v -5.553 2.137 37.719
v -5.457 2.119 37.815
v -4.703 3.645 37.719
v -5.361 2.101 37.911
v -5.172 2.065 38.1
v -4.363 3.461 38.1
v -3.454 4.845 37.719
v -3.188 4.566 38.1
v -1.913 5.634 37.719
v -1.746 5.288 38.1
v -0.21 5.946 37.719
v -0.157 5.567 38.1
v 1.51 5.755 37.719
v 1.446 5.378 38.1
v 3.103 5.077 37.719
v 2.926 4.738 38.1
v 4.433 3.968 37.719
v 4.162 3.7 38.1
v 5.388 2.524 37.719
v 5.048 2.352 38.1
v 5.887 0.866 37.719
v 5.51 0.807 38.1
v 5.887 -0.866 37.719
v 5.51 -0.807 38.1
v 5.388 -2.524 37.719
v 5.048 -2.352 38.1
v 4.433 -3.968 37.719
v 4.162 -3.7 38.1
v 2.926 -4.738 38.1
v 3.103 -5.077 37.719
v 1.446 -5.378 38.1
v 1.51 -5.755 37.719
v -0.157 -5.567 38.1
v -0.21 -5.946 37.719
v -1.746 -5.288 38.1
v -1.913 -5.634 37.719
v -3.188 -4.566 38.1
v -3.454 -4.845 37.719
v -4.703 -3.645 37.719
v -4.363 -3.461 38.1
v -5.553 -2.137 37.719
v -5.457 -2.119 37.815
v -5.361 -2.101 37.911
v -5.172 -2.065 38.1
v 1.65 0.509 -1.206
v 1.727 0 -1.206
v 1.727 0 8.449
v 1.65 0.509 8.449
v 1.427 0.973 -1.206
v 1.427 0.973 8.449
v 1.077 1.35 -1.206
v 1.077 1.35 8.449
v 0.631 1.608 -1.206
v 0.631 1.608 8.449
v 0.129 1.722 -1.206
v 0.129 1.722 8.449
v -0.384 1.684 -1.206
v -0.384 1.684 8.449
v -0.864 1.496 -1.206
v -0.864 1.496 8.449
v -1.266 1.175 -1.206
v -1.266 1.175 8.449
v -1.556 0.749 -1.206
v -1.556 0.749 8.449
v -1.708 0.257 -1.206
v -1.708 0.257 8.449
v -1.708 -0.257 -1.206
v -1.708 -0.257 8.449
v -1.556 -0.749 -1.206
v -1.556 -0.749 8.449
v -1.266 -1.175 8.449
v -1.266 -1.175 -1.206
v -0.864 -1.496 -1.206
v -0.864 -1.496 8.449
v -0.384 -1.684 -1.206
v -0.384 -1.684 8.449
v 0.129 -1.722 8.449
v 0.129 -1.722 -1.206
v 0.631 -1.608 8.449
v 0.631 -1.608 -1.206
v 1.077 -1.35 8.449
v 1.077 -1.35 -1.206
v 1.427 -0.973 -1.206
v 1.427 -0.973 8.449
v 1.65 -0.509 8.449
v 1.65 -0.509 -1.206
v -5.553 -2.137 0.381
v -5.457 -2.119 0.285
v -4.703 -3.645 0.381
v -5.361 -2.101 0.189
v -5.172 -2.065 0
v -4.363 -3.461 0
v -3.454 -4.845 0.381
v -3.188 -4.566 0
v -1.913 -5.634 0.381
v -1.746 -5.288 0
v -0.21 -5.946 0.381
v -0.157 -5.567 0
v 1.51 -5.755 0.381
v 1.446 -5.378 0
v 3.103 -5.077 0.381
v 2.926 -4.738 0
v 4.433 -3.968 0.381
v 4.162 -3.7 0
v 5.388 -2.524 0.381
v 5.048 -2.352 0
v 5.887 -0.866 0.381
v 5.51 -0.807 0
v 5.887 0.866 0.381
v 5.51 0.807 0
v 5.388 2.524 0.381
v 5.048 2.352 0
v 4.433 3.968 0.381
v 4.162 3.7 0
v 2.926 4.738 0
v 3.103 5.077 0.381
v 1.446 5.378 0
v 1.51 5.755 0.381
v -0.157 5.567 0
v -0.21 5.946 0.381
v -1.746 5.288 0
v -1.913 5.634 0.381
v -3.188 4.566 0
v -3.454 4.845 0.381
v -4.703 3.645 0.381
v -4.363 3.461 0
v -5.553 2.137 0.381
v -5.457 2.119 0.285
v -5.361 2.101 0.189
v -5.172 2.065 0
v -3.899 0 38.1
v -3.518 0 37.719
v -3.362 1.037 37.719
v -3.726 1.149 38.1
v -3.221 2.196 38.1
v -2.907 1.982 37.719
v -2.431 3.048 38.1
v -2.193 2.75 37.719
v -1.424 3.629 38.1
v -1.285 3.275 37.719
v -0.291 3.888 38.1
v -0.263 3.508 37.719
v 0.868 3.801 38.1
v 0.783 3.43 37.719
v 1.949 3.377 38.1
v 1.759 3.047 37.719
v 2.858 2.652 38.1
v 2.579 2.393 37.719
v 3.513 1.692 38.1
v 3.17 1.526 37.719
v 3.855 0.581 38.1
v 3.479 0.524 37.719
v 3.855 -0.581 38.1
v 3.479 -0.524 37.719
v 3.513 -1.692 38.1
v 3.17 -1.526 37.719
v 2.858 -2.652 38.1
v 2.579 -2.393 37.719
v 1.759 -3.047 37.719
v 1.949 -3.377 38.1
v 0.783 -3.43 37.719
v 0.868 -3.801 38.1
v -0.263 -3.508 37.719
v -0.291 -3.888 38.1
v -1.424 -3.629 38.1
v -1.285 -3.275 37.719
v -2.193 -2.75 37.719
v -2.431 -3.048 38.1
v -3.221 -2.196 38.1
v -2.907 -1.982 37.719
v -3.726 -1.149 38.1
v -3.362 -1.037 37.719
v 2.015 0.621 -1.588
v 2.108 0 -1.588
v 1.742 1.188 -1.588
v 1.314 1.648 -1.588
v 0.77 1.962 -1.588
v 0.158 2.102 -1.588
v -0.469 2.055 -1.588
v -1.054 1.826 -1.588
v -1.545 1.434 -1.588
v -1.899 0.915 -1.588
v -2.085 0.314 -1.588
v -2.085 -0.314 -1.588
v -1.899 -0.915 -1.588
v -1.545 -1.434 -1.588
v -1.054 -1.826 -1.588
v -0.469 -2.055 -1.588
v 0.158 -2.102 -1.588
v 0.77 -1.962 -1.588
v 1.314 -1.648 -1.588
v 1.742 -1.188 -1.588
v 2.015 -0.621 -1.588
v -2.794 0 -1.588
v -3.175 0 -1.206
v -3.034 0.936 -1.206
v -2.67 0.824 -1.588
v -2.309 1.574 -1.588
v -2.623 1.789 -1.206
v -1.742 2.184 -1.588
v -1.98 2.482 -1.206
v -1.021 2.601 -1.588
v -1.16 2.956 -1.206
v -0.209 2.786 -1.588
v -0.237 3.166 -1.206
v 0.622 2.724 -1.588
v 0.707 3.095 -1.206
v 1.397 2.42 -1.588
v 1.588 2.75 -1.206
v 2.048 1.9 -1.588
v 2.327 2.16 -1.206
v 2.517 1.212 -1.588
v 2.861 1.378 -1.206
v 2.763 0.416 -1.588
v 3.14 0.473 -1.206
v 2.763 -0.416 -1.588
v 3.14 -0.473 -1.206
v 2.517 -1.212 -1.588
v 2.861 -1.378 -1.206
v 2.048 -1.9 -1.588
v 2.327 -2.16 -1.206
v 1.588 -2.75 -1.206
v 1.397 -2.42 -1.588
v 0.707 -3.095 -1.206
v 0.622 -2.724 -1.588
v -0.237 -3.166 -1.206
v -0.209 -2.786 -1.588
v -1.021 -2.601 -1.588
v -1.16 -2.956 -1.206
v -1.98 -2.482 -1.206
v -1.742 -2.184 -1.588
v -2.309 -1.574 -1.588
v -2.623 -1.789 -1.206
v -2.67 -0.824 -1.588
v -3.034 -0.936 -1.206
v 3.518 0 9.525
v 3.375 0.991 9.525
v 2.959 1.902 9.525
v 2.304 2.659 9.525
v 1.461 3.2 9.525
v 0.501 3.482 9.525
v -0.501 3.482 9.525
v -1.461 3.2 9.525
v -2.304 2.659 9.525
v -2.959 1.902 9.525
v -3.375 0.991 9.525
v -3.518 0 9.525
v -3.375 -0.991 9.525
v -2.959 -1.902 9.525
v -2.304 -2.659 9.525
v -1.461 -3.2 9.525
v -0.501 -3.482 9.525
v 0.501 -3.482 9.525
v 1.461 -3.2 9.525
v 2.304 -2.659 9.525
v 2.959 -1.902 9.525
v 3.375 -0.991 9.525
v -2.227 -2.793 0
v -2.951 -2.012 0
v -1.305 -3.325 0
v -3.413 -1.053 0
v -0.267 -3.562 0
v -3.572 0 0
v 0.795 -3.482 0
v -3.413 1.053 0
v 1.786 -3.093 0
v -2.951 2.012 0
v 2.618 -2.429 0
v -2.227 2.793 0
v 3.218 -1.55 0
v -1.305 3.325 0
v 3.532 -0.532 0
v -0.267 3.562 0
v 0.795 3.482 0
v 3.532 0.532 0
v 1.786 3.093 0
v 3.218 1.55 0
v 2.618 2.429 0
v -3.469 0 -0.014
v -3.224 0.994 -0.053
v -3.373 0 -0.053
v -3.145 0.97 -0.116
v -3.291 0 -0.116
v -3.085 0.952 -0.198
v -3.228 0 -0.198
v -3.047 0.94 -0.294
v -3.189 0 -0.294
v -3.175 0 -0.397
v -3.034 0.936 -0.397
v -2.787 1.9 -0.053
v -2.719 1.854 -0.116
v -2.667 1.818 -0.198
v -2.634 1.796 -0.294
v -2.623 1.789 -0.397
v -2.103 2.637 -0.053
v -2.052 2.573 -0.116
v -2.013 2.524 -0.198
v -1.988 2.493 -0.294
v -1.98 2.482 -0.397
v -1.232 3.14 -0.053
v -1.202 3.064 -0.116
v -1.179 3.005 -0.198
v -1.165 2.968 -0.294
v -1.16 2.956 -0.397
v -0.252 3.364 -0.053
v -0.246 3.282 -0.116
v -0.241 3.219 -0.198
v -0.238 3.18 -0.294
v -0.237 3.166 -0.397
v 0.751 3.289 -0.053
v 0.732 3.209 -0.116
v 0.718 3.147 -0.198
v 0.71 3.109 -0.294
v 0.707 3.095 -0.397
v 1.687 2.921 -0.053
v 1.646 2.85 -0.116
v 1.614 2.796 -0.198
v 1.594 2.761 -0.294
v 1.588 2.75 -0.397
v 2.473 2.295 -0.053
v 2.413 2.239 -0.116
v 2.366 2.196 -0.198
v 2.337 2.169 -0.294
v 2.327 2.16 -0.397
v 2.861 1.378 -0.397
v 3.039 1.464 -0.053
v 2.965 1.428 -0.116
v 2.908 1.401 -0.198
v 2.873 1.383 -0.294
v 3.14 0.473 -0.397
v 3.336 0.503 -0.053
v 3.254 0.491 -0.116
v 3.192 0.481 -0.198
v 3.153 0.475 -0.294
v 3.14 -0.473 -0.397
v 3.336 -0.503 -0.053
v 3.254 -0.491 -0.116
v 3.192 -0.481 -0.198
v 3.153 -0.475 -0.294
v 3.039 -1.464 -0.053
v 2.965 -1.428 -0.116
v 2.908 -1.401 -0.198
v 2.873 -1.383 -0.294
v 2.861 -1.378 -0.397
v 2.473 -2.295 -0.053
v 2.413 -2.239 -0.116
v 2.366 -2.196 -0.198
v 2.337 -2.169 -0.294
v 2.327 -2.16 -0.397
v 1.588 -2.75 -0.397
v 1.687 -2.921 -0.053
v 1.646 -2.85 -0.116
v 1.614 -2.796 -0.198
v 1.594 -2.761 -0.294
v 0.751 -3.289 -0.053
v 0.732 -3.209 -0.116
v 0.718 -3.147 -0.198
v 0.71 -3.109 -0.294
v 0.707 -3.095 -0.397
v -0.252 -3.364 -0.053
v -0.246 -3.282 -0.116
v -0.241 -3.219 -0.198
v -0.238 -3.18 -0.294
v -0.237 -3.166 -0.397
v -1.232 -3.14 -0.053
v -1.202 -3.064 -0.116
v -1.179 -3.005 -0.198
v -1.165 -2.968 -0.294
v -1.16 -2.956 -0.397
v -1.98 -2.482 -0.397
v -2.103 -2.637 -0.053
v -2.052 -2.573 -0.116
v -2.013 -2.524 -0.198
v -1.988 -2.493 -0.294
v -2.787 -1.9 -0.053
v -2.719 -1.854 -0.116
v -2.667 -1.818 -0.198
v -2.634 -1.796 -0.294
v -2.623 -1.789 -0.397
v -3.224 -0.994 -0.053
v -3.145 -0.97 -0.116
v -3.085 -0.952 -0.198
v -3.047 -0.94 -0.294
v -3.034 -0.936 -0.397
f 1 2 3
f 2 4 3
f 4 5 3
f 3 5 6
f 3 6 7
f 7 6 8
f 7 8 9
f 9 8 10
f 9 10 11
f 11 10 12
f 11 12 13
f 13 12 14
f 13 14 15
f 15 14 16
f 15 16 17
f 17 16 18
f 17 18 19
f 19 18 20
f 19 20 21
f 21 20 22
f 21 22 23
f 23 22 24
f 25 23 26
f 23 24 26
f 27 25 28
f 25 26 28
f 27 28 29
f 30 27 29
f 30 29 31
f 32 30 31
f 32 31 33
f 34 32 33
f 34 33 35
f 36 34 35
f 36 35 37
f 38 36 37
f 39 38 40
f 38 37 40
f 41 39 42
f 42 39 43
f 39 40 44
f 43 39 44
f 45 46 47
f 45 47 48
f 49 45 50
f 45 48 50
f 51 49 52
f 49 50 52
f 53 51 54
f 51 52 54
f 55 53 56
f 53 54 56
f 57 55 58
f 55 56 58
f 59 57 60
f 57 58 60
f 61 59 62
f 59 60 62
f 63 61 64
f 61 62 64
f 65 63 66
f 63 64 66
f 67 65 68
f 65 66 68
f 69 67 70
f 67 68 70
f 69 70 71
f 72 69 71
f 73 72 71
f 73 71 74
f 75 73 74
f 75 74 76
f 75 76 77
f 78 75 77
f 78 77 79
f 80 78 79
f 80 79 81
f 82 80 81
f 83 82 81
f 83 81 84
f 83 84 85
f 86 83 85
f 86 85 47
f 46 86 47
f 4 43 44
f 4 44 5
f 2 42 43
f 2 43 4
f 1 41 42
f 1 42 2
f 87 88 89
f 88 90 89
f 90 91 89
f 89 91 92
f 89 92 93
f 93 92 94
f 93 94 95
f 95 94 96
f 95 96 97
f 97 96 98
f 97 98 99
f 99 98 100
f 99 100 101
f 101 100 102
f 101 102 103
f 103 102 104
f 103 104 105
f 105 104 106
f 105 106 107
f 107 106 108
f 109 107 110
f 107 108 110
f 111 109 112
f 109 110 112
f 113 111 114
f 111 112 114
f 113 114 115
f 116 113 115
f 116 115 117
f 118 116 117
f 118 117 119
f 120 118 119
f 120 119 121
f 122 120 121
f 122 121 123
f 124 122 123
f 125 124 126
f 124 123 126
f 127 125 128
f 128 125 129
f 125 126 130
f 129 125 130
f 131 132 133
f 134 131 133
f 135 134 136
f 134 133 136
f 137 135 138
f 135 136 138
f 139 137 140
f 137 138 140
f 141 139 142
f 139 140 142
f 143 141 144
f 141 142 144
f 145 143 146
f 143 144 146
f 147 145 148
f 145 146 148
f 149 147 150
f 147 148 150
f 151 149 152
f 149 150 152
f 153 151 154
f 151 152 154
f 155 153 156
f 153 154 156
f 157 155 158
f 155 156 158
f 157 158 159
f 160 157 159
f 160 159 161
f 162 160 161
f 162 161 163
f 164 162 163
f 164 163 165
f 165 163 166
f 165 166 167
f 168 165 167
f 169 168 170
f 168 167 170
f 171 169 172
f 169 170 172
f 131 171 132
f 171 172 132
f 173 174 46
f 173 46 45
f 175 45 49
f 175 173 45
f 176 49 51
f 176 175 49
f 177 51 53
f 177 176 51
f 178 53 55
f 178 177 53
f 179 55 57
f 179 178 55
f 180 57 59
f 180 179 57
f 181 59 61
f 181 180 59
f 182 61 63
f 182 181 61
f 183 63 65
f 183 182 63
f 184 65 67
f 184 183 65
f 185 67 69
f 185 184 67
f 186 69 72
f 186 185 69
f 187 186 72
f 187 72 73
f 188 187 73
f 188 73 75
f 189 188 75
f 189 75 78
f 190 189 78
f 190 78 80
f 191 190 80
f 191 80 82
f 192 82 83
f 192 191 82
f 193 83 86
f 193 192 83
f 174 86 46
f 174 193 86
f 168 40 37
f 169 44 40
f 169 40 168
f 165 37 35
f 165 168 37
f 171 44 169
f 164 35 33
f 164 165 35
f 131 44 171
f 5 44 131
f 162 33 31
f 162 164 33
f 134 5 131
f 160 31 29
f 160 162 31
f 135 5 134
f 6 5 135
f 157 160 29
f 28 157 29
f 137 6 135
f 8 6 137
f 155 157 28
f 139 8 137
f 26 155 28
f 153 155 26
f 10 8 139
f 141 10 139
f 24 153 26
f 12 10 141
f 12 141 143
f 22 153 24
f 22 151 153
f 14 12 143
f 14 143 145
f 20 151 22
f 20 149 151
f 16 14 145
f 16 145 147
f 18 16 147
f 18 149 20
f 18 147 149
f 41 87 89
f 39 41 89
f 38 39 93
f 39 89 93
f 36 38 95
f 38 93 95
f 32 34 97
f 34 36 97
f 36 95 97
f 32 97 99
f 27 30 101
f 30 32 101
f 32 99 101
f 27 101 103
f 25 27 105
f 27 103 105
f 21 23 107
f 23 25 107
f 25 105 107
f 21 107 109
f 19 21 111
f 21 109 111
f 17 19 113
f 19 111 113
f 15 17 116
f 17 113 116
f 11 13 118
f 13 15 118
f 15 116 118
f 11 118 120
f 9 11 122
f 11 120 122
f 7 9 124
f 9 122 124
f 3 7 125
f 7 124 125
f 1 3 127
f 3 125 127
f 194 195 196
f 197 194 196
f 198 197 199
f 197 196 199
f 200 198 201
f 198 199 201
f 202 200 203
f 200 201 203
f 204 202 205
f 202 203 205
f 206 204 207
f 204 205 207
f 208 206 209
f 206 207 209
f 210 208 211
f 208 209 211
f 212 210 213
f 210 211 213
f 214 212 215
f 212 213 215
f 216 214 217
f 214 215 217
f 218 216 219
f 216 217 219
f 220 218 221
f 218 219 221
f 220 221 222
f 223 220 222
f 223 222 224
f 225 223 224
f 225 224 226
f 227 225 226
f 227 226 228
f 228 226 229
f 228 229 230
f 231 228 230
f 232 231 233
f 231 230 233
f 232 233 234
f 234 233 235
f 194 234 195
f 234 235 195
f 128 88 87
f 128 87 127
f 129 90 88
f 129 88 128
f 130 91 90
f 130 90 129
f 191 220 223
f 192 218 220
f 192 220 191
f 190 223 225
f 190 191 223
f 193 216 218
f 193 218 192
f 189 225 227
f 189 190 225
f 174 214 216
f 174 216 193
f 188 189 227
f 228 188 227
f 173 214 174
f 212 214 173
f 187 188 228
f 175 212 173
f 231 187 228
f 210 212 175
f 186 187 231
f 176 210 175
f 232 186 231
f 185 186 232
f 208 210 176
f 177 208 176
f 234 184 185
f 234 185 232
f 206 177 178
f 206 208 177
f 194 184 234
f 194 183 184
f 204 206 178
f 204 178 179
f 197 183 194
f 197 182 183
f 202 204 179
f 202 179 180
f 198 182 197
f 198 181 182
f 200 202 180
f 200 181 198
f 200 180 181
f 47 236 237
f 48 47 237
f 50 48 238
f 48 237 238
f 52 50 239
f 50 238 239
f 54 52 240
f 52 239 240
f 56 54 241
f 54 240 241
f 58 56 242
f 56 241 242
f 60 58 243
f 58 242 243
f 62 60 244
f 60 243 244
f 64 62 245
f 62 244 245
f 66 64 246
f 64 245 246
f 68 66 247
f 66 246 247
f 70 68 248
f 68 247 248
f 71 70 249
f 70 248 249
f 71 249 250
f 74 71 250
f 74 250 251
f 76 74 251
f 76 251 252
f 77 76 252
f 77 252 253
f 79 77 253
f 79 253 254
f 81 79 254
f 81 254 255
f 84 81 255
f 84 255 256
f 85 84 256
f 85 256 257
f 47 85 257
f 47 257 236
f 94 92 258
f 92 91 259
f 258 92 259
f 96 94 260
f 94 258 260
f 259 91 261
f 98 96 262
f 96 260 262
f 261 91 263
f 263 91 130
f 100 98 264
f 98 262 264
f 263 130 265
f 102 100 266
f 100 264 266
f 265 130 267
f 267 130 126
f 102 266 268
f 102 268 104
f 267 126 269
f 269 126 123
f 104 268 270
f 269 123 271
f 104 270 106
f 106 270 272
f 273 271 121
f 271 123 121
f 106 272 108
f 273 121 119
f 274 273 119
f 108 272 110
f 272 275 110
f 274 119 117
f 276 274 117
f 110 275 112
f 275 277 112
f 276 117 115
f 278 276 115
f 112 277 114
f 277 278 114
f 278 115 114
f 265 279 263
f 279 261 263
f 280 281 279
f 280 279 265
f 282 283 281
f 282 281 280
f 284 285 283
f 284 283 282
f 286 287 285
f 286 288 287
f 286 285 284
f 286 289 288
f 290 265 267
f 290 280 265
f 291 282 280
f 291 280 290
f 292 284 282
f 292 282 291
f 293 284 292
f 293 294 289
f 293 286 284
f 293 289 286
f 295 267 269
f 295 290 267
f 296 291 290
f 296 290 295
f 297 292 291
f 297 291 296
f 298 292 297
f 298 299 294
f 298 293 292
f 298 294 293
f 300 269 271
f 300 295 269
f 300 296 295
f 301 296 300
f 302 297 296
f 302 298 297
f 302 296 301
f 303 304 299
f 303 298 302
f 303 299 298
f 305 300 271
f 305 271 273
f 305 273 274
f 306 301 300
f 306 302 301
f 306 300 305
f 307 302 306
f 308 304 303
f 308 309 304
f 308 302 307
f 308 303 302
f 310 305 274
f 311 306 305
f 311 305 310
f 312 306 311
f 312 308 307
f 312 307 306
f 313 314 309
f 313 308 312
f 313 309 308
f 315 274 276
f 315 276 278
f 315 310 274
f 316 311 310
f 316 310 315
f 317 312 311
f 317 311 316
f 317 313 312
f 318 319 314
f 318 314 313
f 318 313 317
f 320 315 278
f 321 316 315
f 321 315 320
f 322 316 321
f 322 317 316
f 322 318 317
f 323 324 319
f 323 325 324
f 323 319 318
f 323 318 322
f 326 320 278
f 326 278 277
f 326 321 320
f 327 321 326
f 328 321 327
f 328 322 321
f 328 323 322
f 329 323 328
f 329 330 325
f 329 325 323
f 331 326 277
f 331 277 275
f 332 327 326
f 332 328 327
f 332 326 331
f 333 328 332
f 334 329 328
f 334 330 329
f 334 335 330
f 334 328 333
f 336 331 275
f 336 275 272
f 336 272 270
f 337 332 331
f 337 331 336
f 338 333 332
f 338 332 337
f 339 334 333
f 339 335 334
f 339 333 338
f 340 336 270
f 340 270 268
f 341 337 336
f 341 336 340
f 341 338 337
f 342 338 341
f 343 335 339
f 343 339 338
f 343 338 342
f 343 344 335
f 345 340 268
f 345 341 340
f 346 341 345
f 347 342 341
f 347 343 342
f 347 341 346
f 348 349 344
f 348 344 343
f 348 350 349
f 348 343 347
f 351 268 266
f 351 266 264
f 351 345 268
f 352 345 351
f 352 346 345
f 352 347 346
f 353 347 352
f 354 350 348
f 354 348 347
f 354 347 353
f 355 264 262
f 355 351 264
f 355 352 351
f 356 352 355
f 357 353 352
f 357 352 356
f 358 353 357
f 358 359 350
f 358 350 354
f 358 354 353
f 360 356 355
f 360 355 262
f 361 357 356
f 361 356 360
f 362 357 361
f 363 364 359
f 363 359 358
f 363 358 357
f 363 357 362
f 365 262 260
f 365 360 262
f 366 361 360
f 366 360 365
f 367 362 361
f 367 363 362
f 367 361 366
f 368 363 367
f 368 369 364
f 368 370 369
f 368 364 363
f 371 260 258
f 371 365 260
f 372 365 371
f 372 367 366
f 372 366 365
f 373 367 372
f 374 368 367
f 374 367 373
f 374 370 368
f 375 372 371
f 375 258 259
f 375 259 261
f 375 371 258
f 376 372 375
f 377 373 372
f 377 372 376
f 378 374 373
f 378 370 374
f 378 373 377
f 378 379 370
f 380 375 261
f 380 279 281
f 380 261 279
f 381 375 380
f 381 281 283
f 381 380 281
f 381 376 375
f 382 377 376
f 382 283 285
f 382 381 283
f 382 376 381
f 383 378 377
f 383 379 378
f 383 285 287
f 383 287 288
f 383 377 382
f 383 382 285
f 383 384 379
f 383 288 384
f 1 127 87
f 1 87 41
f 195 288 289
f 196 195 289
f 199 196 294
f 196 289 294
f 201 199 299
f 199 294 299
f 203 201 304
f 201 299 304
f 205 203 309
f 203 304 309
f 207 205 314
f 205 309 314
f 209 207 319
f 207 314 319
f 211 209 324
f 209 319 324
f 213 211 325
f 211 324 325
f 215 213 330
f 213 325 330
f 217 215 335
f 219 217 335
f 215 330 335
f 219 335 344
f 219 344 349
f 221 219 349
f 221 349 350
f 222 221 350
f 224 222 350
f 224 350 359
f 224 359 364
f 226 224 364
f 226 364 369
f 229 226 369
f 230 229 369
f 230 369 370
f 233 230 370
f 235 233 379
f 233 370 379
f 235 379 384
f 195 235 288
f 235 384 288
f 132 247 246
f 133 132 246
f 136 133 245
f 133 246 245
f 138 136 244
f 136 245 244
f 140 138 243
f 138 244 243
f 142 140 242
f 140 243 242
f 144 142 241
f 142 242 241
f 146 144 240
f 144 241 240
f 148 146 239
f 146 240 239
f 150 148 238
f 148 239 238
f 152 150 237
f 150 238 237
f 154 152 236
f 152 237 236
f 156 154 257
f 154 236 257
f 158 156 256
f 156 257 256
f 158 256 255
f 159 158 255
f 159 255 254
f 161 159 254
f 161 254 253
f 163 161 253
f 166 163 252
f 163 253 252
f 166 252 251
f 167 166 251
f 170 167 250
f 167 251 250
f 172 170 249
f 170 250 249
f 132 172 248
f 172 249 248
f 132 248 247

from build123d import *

# Parameters (mm, degrees)
SKETCH1_R                    = 5.95
BOSS_EXTRUDE1_DEPTH          = 38.1
SKETCH2_R                    = 3.175
BOSS_EXTRUDE2_DEPTH          = 1.5875
J_0_277_DIAMETER_HOLE1_D     = 7.0358
J_0_277_DIAMETER_HOLE1_DEPTH = 28.575
J_0_277_DIAMETER_HOLE1_TIP   = 2.113767572
F_8_32_TAPPED_HOLE2_D        = 3.4544
SKETCH9_W                    = 38.1
SKETCH9_H                    = 6
CUT_EXTRUDE3_DEPTH           = 1.396875
CHAMFER1_SIZE                = 0.381
FILLET1_R                    = 0.396875


with BuildPart() as part:
    # Sketch1 → Boss-Extrude1 (new body)
    with BuildSketch(Plane.XY):
        Circle(SKETCH1_R)
    extrude(amount=BOSS_EXTRUDE1_DEPTH)

    # Sketch2 → Boss-Extrude2 (add)
    with BuildSketch(Plane(origin=(0, 0, 0), x_dir=(-1, 0, 0), z_dir=(0, 0, -1))):
        Circle(SKETCH2_R)
    extrude(amount=BOSS_EXTRUDE2_DEPTH)

    # J (0.277) Diameter Hole1
    with Locations(Plane.XY.offset(38.1)):
        with Locations((0, 0)):
            Hole(J_0_277_DIAMETER_HOLE1_D / 2, depth=J_0_277_DIAMETER_HOLE1_DEPTH)
            with Locations((0, 0, -(J_0_277_DIAMETER_HOLE1_DEPTH + J_0_277_DIAMETER_HOLE1_TIP / 2))):  # 118° drill point
                Cone(0, J_0_277_DIAMETER_HOLE1_D / 2, J_0_277_DIAMETER_HOLE1_TIP, mode=Mode.SUBTRACT)

    # #8-32 Tapped Hole2 (through all)
    with Locations(Plane(origin=(0, 0, -1.5875), x_dir=(-1, 0, 0), z_dir=(0, 0, -1))):
        with Locations((0, 0)):
            Hole(F_8_32_TAPPED_HOLE2_D / 2)

    # Sketch9 → Cut-Extrude3 (cut, through all)
    with BuildSketch(Plane.ZY.offset(5.553125)):
        with Locations((19.05, 0)):
            Rectangle(SKETCH9_W, SKETCH9_H)
    extrude(amount=CUT_EXTRUDE3_DEPTH, mode=Mode.SUBTRACT)

    # Chamfer1
    chamfer1_edges = [part.edges().sort_by_distance(p)[0] for p in [
        (3.5179, 0, 38.1),
        (-1.7272, 0, -1.5875),
        (5.95, 0, 0),
        (-5.553125, 0, 0),
        (5.95, 0, 38.1),
        (-5.553125, 0, 38.1),
        (3.175, 0, -1.5875),
    ]]
    chamfer(chamfer1_edges, length=CHAMFER1_SIZE)

    # Fillet1
    fillet1_edges = [part.edges().sort_by_distance(p)[0] for p in [
        (3.175, 0, 0),
    ]]
    fillet(fillet1_edges, radius=FILLET1_R)


solid = part.part
